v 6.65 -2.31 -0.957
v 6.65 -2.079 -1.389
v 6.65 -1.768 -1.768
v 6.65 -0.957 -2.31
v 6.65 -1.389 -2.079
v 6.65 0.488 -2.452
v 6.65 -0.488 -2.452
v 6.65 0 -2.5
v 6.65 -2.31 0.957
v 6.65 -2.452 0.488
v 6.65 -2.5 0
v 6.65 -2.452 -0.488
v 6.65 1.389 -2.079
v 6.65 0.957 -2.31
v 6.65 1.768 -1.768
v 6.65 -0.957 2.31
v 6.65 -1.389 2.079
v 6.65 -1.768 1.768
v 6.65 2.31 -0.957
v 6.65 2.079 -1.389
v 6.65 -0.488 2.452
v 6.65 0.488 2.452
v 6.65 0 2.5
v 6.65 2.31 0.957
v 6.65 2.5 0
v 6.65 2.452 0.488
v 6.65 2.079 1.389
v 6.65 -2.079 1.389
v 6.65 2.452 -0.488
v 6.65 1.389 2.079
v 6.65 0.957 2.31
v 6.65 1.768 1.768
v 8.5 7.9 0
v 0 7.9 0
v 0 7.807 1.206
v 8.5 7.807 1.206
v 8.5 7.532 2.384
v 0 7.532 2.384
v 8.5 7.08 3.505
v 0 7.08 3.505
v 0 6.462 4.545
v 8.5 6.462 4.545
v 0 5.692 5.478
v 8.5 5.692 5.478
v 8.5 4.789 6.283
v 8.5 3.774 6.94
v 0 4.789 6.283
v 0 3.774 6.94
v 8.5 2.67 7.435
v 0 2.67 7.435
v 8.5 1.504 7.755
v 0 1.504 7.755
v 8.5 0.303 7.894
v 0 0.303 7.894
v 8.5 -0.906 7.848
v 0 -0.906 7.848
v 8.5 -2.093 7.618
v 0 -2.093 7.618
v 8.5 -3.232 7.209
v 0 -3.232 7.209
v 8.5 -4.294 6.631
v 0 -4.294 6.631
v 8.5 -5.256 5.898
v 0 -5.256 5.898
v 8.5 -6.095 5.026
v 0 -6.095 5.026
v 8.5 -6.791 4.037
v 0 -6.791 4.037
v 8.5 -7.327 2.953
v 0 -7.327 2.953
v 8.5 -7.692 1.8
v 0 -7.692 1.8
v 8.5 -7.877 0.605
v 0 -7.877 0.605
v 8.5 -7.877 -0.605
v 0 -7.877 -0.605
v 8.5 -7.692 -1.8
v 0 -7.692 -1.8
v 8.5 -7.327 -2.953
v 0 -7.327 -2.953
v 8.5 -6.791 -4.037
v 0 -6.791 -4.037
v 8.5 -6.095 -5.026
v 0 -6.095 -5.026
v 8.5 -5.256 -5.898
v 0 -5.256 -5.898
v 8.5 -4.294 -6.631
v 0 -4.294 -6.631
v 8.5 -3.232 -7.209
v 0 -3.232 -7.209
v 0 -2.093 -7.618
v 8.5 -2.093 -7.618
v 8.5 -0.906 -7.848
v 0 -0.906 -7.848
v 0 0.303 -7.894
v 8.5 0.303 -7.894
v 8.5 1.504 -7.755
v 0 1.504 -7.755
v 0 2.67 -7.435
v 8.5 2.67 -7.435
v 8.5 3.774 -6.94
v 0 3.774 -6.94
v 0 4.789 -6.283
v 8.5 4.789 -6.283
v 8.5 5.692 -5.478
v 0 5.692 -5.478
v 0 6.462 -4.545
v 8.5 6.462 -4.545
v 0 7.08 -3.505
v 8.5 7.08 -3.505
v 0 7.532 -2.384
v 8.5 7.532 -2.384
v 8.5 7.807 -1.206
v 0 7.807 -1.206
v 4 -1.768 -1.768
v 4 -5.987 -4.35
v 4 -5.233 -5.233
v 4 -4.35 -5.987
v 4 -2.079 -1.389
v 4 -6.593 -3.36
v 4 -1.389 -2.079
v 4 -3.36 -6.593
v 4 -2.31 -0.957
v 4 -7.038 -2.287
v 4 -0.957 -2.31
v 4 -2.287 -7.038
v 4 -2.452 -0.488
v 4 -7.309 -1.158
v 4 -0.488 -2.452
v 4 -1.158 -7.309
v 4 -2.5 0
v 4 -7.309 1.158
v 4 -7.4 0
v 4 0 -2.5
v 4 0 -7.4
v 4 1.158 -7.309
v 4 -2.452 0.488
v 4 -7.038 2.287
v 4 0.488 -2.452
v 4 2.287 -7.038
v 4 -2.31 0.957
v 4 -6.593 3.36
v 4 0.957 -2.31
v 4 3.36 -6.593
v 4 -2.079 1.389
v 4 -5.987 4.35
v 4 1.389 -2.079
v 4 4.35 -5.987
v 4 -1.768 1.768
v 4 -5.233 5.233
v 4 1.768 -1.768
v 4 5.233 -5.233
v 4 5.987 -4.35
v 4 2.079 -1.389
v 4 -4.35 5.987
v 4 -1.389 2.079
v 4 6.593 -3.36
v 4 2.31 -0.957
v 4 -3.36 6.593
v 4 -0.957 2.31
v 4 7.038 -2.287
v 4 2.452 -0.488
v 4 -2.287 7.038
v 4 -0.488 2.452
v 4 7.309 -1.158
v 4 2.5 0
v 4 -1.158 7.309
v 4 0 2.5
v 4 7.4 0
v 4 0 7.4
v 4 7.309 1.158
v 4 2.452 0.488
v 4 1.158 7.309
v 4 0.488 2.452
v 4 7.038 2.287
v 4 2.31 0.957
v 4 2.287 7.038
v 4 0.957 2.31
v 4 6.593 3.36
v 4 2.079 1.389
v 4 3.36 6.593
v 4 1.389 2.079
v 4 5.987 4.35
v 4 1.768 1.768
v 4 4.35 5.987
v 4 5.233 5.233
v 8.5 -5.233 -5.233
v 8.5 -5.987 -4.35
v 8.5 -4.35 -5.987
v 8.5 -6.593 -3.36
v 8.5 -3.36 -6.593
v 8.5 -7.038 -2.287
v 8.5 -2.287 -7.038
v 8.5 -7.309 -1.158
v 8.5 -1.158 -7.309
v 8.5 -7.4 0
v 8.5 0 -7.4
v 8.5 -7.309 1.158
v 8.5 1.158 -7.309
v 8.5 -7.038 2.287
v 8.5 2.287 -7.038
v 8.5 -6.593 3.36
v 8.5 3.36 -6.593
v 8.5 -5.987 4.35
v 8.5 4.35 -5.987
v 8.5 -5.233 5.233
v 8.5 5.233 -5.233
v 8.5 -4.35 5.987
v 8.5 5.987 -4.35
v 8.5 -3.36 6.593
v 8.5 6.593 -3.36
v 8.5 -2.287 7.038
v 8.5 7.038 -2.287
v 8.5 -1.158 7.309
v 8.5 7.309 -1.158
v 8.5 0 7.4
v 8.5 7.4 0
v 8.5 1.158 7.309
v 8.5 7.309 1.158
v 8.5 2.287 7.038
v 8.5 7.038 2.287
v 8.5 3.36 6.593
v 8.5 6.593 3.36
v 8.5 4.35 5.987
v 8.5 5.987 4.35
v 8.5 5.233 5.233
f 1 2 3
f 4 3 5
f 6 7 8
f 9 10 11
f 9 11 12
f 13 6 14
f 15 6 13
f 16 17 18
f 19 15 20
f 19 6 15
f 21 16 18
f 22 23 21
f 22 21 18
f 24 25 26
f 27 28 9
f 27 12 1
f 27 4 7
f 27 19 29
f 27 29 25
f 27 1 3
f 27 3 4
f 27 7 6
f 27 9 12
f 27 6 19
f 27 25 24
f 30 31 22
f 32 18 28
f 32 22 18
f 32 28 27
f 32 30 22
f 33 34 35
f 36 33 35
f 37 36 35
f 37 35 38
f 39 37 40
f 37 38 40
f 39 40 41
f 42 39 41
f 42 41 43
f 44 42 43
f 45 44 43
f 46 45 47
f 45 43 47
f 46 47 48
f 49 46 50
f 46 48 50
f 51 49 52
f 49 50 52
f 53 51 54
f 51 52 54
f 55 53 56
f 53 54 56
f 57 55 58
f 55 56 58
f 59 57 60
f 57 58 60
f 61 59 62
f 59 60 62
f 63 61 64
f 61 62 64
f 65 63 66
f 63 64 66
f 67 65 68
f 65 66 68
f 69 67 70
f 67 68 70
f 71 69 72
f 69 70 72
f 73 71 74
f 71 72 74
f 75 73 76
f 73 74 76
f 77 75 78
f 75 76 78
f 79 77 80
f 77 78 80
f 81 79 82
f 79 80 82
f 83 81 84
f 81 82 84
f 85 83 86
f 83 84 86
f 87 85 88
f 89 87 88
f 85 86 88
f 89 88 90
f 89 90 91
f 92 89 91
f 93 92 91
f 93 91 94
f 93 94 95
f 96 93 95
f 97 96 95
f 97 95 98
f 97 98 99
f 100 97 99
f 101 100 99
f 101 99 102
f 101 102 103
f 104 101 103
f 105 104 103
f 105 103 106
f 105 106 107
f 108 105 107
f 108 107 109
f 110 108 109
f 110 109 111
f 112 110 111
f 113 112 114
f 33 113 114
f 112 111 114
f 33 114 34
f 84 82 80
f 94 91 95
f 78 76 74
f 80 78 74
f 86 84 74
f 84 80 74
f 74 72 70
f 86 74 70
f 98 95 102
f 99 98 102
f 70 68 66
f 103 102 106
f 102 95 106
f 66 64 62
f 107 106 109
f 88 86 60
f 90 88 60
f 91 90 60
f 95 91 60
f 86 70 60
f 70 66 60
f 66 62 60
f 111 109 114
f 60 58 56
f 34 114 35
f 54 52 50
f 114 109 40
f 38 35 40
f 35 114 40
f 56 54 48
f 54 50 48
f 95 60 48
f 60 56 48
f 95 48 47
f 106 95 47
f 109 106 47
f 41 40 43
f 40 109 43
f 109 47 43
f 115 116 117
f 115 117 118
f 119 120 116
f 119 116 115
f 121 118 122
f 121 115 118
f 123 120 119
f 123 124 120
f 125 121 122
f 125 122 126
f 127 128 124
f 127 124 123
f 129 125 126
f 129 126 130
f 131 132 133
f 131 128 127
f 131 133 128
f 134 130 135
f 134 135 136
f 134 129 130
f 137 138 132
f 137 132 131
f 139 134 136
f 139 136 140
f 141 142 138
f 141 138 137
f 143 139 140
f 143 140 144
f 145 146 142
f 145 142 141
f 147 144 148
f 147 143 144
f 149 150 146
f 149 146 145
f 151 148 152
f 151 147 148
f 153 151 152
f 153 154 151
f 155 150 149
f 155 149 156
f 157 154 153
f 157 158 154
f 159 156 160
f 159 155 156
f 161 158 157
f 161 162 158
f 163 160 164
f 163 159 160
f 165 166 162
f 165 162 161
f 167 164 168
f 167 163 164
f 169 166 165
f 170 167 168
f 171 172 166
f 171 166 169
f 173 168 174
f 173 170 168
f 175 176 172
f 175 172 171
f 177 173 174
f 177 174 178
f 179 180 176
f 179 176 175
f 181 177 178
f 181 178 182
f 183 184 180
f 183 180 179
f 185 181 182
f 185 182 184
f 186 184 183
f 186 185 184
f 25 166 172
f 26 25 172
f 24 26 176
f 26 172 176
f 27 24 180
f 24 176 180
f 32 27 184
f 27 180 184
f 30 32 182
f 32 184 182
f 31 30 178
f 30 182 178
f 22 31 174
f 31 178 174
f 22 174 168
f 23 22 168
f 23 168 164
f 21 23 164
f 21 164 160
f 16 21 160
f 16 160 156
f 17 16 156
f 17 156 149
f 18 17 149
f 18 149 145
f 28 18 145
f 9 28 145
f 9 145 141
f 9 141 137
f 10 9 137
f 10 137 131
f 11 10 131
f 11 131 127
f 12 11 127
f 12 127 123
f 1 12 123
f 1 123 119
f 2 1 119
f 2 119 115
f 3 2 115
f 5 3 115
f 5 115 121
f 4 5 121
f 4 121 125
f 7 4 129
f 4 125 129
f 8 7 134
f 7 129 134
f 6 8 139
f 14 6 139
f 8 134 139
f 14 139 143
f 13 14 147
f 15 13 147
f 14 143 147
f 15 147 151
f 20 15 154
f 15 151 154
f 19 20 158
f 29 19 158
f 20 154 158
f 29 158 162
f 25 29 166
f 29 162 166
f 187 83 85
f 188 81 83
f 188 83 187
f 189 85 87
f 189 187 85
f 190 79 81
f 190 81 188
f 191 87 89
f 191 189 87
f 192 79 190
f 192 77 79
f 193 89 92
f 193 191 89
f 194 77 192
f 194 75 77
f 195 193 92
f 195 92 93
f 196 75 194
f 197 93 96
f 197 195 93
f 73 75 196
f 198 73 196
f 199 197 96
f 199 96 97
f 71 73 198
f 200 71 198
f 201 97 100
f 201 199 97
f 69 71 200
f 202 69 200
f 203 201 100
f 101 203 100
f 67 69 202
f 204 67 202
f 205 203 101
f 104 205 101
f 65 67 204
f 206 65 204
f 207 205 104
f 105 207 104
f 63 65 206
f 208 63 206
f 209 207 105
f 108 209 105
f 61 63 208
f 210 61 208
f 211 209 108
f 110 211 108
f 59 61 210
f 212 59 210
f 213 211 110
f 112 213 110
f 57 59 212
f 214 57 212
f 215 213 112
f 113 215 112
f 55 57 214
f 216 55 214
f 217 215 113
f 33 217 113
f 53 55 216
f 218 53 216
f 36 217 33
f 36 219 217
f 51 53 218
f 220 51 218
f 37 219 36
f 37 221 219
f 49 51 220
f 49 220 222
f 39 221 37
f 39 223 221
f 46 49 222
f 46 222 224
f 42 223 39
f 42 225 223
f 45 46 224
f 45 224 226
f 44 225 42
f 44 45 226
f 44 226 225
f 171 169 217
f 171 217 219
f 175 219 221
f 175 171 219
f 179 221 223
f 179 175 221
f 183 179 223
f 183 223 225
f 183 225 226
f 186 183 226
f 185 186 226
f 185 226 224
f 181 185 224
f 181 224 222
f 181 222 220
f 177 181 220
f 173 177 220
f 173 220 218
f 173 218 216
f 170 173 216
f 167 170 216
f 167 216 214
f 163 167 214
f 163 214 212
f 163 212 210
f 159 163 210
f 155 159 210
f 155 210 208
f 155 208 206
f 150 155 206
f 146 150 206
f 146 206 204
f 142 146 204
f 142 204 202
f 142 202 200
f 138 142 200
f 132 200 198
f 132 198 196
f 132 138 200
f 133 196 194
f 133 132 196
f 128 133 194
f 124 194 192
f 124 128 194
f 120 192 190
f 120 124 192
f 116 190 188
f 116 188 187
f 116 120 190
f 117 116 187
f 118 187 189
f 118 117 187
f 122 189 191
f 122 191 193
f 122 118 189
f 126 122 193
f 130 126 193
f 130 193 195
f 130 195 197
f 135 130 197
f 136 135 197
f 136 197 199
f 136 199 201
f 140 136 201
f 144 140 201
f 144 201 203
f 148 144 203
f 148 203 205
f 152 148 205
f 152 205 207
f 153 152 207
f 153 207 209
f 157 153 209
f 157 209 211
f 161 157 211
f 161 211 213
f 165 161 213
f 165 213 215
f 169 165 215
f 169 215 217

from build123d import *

# Parameters (mm, degrees)
F0_R     = 7.4
F0_R_2   = 2.5
F1_DEPTH = 4
F0_R_3   = 7.9
F2_DEPTH = 8.5
F3_DEPTH = 6.65


with BuildPart() as f1:
    # F0 (on Right) → F1 (new body)
    with BuildSketch(Plane.YZ):
        Circle(F0_R)
        Circle(F0_R_2, mode=Mode.SUBTRACT)
    extrude(amount=F1_DEPTH)

    # F0 (on Right) → F2 (join)
    with BuildSketch(Plane.YZ):
        Circle(F0_R_3)
        Circle(F0_R, mode=Mode.SUBTRACT)
    extrude(amount=F2_DEPTH)

    # F0 (on Right) → F3 (join)
    with BuildSketch(Plane.YZ):
        Circle(F0_R_2)
    extrude(amount=F3_DEPTH)


solid = f1.part
